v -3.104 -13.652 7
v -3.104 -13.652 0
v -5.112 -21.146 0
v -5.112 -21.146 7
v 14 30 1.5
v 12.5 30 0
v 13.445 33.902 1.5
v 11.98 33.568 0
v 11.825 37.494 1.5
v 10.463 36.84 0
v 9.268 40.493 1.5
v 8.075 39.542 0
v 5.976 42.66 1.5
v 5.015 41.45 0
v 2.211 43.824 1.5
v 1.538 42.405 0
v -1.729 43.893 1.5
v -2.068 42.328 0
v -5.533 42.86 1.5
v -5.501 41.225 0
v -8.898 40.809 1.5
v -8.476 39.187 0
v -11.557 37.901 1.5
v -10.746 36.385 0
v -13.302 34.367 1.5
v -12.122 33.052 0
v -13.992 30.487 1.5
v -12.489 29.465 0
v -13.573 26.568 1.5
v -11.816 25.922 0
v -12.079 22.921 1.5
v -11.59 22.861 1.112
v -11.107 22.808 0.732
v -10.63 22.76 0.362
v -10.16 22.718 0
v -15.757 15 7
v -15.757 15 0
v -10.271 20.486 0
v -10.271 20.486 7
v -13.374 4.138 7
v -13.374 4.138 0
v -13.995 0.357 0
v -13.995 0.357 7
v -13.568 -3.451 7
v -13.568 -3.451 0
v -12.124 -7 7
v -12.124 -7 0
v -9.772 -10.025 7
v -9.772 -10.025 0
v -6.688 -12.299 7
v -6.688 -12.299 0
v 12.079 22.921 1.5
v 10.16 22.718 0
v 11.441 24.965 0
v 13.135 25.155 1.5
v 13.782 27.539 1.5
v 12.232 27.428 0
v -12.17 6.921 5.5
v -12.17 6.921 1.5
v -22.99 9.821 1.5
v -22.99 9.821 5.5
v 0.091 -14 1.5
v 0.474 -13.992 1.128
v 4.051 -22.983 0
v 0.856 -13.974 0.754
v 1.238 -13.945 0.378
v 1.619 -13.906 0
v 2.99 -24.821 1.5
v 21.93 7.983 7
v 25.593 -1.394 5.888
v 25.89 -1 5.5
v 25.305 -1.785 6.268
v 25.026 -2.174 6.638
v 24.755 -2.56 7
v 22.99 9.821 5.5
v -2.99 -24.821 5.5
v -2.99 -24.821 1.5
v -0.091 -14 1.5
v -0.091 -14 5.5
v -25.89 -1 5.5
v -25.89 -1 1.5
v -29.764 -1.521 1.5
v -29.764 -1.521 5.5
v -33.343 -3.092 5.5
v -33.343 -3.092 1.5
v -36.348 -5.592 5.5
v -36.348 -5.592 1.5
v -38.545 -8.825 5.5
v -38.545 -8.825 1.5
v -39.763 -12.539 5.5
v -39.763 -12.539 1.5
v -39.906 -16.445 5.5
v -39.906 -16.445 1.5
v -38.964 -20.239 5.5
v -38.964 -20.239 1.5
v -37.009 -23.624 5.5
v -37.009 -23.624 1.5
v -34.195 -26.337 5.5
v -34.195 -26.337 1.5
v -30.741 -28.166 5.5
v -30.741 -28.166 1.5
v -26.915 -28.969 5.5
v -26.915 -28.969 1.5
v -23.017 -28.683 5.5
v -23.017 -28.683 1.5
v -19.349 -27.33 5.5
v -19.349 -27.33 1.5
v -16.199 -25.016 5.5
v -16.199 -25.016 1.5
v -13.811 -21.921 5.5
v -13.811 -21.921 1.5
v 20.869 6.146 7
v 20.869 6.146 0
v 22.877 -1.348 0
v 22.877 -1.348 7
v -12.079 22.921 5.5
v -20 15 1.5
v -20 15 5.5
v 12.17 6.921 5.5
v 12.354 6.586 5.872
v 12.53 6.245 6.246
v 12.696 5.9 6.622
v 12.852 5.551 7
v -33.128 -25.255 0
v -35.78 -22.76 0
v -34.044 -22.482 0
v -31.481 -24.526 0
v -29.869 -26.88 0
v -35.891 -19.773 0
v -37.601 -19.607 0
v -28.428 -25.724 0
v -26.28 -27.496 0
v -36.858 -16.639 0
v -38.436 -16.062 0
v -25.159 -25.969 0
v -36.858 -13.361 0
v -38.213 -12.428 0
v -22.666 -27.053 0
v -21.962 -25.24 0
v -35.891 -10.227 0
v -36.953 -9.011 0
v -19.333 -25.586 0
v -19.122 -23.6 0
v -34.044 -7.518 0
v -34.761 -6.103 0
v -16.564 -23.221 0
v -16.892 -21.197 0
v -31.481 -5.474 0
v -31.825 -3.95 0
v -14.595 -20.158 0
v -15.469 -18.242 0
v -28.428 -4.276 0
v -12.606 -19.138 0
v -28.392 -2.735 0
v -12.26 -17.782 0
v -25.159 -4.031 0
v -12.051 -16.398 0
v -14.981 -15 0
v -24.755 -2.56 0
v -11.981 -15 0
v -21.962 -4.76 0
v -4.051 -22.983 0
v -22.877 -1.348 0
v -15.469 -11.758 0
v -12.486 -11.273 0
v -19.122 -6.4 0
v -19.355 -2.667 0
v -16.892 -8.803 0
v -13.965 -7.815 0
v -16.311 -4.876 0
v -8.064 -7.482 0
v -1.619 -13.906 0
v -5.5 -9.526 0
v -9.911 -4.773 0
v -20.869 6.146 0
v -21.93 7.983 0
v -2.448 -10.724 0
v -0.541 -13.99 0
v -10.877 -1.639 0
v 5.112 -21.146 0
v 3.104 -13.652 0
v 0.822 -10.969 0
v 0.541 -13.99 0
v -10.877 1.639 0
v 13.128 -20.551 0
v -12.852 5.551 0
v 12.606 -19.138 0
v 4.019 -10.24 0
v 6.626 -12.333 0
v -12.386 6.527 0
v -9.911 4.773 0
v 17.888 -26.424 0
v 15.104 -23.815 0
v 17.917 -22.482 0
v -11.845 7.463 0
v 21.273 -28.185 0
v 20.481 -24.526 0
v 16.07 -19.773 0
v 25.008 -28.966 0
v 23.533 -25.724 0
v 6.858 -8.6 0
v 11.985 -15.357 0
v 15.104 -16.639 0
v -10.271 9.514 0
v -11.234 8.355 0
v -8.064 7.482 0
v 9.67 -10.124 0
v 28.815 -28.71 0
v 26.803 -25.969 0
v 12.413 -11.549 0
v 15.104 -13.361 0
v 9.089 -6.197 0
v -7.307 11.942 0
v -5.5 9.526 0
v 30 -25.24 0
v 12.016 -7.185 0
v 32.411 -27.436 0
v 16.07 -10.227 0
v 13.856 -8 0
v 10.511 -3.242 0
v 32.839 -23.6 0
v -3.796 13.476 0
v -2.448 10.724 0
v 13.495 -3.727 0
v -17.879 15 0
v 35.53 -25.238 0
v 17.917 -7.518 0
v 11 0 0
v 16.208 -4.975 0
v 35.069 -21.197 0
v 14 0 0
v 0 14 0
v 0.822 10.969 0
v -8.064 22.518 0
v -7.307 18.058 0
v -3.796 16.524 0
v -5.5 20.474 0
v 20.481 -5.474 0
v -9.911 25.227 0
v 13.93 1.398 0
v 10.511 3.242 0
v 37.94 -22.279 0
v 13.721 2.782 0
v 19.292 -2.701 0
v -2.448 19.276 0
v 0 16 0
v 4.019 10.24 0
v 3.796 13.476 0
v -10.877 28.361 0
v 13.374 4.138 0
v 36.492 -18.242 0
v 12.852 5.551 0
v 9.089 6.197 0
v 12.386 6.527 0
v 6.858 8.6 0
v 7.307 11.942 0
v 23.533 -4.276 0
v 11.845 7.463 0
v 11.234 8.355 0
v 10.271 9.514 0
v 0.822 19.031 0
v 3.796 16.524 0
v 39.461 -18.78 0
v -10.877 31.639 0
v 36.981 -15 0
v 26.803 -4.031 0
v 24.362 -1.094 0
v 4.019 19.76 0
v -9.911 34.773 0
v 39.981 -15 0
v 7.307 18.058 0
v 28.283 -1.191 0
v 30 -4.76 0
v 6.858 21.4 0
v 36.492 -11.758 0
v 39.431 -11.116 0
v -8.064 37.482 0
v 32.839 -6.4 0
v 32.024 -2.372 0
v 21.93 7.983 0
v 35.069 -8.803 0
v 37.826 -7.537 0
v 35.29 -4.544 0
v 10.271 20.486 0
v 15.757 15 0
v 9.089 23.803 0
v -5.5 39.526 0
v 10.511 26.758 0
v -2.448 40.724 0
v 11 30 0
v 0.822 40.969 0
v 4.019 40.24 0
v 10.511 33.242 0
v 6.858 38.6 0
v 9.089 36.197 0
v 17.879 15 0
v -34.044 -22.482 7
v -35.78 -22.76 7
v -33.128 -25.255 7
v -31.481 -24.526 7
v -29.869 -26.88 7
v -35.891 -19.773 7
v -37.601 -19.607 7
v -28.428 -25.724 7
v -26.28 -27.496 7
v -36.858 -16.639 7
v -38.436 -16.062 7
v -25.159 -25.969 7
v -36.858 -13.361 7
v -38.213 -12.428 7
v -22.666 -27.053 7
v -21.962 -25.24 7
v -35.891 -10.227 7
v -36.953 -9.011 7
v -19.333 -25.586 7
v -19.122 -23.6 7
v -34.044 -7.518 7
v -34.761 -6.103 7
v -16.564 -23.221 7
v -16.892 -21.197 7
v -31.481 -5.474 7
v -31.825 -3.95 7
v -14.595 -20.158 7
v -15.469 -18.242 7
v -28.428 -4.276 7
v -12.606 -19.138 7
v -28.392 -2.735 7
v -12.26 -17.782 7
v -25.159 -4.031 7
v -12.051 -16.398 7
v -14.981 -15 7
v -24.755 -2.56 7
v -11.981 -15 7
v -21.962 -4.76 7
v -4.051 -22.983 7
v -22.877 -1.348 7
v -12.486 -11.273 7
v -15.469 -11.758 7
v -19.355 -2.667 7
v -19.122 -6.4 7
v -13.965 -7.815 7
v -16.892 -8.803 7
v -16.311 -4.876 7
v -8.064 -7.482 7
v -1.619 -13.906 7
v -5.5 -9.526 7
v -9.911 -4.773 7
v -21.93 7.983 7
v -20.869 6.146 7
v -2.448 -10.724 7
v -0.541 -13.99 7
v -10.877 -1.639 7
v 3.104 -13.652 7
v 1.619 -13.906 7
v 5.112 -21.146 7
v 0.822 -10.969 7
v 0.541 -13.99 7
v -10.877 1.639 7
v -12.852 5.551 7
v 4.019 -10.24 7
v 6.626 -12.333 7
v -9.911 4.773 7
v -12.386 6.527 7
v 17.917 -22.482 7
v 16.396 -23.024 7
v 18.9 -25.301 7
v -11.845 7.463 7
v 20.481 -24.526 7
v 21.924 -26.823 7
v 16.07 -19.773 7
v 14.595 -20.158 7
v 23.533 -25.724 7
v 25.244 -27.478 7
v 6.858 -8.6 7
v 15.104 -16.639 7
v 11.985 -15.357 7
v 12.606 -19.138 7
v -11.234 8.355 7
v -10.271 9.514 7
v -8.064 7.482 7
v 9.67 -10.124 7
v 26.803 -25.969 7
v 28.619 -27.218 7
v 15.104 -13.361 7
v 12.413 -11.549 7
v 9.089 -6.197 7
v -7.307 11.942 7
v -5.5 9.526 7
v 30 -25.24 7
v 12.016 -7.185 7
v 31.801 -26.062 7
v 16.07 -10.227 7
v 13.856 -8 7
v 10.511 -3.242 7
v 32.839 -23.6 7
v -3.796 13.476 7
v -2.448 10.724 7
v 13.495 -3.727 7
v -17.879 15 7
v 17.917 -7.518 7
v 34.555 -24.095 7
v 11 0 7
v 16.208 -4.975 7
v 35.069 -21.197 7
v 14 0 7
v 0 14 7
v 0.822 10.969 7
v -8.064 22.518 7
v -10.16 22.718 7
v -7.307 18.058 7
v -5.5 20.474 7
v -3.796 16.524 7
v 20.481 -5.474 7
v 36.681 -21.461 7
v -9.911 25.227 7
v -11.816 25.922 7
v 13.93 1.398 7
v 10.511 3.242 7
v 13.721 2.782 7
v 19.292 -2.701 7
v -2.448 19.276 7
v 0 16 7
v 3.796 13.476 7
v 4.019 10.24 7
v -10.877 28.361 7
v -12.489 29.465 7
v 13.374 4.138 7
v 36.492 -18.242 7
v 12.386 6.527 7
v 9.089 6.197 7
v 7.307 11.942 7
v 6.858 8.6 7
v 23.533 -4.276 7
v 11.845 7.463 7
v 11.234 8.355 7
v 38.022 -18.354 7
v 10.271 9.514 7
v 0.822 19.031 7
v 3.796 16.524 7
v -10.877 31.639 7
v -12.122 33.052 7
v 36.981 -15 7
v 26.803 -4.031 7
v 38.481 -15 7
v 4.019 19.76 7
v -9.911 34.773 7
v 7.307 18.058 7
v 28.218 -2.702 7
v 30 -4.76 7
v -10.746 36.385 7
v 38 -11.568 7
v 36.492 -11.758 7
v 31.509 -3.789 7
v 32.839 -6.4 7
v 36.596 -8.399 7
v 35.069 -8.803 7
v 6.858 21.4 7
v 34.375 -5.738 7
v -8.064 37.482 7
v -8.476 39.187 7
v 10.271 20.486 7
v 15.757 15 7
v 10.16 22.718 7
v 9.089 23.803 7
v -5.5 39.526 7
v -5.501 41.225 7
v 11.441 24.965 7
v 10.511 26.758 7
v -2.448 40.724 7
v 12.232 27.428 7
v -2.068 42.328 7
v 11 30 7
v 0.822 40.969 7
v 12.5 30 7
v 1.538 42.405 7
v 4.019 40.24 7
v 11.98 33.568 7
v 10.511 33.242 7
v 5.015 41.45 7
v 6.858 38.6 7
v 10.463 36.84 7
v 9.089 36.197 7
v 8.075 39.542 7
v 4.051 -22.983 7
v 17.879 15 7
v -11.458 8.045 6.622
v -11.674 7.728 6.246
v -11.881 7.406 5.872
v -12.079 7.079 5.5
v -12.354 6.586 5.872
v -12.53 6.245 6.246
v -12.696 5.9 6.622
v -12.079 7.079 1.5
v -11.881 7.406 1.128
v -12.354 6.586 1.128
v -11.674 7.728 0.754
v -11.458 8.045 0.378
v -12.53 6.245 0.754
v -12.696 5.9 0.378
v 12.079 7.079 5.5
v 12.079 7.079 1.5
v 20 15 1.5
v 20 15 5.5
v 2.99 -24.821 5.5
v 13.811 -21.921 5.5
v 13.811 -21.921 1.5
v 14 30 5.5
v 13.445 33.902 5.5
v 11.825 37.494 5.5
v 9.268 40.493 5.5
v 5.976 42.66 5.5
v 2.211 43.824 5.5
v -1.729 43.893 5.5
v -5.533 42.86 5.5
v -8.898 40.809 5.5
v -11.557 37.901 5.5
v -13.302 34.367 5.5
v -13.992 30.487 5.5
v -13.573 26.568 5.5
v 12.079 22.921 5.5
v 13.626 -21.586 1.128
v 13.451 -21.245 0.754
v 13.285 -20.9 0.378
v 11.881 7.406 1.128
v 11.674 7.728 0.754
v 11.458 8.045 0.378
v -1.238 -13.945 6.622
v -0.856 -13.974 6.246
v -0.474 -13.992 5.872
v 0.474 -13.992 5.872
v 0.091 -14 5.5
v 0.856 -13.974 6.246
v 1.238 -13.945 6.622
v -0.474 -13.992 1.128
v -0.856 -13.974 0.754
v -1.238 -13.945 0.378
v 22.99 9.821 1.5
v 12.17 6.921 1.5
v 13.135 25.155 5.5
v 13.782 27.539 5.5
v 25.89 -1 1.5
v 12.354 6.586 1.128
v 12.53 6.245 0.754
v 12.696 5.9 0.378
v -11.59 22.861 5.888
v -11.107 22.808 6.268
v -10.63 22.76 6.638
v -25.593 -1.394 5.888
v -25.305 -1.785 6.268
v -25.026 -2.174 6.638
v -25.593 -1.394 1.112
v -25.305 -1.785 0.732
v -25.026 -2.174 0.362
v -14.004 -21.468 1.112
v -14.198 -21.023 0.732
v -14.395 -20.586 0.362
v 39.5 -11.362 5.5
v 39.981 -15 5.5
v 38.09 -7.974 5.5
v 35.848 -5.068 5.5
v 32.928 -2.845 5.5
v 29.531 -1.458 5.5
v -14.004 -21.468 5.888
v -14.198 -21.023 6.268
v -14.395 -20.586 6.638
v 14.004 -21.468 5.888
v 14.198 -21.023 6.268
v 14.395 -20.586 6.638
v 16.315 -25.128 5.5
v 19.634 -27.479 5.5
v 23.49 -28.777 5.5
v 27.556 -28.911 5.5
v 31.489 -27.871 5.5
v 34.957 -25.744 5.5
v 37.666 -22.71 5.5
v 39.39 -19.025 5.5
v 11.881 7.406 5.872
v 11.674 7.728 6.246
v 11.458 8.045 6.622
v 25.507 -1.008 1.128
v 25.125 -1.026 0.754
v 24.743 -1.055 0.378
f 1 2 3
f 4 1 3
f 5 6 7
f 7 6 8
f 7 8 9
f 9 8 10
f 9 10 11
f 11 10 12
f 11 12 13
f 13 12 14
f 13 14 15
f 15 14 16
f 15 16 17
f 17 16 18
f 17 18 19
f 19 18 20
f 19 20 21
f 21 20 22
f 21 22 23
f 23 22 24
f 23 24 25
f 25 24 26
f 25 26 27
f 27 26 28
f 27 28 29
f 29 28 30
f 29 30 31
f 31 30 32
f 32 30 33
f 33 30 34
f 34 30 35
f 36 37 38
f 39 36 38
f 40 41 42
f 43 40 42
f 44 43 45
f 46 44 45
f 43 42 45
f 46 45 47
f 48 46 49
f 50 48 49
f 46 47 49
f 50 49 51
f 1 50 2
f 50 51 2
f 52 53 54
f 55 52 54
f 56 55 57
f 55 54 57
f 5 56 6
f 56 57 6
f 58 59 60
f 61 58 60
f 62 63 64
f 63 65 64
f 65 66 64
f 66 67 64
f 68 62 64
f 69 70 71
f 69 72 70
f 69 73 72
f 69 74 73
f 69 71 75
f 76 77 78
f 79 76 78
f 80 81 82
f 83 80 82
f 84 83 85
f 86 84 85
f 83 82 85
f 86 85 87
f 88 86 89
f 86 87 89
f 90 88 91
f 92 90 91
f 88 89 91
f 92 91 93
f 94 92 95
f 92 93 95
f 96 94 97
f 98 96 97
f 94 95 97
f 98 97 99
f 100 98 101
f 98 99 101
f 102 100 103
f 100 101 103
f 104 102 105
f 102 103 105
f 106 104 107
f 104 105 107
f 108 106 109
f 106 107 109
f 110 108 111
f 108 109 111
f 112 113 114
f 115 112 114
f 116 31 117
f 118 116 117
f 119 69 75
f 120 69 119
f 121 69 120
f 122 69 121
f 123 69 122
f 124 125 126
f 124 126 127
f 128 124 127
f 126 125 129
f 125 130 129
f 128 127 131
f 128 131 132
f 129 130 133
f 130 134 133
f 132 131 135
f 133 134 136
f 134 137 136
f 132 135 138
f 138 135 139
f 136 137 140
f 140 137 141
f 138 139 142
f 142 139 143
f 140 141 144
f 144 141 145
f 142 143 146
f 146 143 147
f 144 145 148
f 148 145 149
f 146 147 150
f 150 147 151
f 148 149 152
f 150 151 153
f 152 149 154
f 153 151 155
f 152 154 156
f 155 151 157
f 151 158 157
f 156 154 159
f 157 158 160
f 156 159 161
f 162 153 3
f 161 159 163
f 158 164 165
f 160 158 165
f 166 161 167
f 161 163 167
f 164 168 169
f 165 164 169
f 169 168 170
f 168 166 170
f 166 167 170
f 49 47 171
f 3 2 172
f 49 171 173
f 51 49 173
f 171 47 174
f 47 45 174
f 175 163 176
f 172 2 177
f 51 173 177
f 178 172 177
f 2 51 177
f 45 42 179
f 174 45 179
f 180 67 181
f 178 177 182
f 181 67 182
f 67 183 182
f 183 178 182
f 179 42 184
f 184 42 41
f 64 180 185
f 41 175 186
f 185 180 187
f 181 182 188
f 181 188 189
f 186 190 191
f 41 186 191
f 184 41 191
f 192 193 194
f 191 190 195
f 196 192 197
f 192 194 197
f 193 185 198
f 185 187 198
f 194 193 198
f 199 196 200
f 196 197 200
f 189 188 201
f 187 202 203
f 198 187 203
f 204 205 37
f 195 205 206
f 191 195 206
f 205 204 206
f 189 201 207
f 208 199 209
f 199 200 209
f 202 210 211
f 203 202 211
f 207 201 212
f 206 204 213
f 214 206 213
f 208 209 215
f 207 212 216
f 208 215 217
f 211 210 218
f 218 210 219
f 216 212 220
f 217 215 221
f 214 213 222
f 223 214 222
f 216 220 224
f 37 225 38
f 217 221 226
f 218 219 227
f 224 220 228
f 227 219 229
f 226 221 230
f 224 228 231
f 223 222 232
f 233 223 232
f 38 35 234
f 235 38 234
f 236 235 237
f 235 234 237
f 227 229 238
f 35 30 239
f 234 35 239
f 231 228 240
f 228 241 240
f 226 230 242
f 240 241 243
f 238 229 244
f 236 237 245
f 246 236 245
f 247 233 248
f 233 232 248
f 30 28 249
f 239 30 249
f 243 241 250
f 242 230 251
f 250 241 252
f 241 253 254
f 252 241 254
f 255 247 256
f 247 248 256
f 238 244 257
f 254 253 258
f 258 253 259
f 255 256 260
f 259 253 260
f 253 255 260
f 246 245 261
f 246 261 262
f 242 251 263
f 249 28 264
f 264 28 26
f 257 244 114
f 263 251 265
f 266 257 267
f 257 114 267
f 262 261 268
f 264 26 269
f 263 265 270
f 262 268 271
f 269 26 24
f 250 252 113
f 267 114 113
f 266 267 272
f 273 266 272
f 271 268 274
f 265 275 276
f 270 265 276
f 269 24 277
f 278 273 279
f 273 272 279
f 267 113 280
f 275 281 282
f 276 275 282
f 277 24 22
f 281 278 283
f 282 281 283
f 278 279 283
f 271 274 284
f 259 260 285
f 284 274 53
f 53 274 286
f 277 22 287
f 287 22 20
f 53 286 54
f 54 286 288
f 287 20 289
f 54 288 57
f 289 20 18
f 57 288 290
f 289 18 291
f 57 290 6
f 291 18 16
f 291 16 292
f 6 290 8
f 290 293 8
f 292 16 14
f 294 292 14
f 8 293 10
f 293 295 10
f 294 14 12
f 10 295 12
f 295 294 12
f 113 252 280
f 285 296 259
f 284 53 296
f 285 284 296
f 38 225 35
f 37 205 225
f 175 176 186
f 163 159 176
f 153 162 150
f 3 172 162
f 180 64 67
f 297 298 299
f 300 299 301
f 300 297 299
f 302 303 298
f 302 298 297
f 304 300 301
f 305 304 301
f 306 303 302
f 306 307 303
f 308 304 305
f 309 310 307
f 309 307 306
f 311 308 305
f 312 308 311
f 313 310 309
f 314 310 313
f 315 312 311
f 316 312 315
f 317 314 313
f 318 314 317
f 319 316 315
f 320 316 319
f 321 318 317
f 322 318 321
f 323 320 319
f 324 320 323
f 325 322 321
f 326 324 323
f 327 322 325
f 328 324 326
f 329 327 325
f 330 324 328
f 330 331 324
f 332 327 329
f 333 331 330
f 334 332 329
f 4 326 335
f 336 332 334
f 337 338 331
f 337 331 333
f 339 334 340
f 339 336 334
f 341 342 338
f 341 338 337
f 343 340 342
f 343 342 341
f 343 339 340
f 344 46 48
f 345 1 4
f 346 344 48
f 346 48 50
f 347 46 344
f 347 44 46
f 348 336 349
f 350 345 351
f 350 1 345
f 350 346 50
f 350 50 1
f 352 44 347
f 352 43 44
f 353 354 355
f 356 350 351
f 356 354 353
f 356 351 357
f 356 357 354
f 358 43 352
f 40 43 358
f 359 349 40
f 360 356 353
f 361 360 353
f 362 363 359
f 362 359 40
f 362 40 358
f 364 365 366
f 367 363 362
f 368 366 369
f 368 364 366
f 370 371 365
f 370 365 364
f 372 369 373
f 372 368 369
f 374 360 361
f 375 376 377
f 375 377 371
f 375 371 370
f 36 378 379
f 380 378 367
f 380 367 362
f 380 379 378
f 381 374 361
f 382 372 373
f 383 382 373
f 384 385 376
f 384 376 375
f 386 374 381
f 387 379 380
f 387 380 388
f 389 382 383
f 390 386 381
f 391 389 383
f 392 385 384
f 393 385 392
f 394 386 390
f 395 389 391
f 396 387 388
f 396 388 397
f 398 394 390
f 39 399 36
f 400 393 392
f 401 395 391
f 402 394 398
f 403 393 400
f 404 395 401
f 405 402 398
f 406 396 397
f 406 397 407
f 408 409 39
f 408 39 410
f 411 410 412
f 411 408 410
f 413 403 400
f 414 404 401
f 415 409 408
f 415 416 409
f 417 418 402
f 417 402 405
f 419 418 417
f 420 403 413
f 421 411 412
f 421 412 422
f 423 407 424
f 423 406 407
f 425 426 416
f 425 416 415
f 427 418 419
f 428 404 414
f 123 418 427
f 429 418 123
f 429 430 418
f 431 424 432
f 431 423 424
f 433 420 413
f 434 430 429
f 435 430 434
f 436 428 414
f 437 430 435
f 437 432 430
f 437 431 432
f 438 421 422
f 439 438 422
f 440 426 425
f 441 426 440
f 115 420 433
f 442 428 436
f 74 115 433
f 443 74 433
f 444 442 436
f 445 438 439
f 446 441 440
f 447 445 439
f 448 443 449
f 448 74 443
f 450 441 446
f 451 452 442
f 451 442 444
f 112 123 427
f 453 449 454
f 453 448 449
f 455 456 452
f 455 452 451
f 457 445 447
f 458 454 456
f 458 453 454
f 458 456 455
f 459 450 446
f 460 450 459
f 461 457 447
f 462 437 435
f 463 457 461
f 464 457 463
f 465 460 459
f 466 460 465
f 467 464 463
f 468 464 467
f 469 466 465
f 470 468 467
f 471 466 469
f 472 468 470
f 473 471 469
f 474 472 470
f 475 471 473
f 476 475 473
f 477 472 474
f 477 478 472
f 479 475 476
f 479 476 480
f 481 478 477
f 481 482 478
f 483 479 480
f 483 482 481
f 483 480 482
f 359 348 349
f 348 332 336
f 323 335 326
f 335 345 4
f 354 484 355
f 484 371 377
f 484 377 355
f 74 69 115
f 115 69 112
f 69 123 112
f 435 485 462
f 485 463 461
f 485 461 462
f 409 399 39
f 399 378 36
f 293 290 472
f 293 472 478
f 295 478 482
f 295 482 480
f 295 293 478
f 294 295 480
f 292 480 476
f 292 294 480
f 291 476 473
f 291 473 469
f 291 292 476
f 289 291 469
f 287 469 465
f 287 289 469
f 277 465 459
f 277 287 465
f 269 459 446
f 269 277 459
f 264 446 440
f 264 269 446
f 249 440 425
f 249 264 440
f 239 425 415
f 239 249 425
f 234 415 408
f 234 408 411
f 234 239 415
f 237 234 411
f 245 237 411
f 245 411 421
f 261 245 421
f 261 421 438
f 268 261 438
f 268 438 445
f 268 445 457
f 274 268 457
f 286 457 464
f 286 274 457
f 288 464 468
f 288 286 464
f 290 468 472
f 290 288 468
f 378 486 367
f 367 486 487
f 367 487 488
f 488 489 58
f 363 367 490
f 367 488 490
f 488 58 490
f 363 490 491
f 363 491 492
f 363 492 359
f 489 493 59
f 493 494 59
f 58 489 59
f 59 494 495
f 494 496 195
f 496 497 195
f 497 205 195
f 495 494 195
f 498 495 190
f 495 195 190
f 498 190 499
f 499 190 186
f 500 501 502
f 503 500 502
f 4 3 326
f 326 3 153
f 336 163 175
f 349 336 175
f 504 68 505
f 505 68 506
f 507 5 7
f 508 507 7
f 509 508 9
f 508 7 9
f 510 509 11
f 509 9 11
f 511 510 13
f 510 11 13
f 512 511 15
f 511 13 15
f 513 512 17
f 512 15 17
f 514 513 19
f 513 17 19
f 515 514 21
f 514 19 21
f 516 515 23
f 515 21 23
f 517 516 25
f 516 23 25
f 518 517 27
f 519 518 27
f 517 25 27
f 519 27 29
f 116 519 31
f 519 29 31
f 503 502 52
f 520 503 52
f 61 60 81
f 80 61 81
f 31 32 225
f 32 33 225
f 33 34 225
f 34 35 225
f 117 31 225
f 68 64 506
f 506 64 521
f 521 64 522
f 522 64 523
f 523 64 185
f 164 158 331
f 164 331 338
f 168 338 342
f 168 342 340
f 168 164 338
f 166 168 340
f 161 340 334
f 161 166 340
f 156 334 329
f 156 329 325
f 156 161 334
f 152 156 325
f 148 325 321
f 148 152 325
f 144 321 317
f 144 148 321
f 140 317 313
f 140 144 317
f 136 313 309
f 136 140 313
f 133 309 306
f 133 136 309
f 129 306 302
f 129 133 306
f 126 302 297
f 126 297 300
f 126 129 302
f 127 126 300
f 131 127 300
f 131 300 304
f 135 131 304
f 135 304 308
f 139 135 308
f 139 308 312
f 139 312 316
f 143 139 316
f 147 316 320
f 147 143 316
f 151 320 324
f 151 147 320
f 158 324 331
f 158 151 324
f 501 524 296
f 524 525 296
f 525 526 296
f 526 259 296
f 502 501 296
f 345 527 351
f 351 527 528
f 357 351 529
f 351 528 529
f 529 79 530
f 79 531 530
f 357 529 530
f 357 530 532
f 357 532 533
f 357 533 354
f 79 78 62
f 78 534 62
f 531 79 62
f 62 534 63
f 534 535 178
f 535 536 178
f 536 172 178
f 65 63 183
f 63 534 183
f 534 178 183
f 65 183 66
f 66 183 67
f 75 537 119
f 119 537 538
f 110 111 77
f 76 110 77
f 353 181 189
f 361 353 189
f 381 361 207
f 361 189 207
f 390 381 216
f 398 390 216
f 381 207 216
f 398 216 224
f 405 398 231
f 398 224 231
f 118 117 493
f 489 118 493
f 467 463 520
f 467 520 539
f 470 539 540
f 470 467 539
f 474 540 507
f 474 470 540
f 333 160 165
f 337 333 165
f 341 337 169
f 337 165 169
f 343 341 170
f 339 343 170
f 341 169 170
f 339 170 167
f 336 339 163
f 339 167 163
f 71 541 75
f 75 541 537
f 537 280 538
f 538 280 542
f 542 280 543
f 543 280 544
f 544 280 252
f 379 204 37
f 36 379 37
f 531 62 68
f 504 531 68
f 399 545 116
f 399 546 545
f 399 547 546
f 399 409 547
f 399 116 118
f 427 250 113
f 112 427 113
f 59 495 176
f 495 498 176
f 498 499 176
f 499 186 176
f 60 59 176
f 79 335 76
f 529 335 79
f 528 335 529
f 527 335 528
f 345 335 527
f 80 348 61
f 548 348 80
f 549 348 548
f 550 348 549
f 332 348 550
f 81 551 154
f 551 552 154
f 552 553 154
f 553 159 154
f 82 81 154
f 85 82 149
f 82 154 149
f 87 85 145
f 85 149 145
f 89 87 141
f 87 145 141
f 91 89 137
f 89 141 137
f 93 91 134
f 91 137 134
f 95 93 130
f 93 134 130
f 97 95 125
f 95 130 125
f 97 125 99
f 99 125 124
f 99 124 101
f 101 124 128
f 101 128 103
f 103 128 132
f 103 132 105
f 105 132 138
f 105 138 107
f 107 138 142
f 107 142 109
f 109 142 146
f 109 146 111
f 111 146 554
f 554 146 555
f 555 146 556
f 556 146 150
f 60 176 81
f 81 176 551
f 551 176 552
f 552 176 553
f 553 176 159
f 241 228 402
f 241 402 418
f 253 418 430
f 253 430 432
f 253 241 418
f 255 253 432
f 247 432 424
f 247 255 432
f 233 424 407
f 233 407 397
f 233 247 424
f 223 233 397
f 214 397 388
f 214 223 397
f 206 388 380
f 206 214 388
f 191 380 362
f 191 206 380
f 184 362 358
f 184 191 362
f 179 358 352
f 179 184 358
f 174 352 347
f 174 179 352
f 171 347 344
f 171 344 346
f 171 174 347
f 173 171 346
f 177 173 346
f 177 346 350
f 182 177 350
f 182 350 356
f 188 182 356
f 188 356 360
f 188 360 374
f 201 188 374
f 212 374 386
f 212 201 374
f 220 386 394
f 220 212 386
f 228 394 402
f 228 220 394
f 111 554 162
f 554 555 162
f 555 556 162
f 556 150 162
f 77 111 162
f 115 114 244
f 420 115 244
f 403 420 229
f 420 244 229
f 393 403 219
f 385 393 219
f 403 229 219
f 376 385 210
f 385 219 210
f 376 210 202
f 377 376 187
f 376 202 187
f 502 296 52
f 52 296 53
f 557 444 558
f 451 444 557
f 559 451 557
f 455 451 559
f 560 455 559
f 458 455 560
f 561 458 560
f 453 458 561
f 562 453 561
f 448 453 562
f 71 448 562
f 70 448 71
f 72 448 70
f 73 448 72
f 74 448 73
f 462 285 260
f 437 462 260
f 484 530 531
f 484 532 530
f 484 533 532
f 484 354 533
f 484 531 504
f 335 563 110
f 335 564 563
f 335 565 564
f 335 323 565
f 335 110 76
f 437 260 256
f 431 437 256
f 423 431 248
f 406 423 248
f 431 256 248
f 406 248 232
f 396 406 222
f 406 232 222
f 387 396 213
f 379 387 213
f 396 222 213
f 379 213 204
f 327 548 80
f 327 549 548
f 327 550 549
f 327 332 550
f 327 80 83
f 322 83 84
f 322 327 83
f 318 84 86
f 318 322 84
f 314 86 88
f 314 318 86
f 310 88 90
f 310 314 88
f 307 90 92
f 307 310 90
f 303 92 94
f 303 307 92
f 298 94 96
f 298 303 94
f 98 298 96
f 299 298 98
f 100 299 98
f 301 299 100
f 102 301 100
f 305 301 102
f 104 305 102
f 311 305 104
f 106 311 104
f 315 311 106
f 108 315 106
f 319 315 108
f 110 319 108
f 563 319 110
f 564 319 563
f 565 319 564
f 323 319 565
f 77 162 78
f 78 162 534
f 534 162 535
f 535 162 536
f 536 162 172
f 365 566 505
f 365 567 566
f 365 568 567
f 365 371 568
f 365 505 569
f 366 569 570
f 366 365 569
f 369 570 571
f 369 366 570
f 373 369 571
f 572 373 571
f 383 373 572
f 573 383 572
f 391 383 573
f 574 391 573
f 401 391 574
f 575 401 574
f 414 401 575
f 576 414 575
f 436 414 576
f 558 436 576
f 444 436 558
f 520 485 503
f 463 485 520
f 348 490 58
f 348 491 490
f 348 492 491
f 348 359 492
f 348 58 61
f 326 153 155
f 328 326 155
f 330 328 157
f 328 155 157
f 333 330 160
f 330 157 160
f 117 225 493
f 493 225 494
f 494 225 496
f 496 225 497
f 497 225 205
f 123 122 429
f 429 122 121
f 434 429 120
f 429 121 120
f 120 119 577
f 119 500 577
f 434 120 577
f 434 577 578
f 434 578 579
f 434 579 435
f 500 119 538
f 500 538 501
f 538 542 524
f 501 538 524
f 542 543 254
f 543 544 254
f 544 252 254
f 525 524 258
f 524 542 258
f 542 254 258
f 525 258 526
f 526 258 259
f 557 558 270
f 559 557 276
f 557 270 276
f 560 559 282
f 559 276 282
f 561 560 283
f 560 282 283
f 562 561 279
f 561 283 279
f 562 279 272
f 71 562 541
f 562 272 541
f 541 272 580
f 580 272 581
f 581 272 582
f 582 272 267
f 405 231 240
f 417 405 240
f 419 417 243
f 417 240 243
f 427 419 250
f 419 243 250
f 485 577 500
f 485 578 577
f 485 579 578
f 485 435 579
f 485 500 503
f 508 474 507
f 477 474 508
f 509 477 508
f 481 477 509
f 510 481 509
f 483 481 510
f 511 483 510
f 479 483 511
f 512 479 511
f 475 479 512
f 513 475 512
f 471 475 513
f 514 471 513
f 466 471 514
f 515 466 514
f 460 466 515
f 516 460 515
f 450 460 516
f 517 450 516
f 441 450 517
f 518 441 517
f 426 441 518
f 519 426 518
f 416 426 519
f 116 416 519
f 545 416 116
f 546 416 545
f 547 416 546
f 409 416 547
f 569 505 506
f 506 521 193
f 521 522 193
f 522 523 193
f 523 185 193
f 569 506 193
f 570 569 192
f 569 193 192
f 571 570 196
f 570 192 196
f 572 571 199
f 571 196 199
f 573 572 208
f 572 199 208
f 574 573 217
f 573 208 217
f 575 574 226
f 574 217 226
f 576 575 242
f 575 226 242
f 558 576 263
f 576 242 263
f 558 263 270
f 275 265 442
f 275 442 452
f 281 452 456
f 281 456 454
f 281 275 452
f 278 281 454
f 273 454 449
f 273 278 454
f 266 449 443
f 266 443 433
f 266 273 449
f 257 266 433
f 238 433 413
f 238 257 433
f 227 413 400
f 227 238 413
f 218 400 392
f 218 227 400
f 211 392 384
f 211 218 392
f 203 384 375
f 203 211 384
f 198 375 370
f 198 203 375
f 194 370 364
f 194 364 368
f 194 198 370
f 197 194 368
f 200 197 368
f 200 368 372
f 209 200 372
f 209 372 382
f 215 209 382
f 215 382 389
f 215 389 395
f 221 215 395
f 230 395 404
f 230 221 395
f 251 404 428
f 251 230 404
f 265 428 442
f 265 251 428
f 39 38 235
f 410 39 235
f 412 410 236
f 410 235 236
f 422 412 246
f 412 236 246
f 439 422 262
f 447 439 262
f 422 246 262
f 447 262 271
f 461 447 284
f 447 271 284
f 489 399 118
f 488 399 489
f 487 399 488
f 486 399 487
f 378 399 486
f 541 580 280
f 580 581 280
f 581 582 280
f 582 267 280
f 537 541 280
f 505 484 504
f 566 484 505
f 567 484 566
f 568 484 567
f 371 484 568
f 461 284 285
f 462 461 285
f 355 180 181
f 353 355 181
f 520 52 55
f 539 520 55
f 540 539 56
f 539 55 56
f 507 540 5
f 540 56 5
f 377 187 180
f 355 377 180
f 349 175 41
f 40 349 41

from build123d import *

# Parameters (mm, degrees)
F0_R     = 11
F1_DEPTH = 7
F2_SIZE  = 1.5


with BuildPart() as f1:
    # F0 (on Top) → F1 (new body)
    with BuildSketch(Plane.XY):
        with BuildLine():
            ThreePointArc((10.2709292347, 9.5135699218), (11.240900909, 8.3451870413), (12.0786220303, 7.0786220303))
            Line((12.0786220303, 7.0786220303), (20, 15))
            Line((20, 15), (12.0786220303, 22.9213779697))
            ThreePointArc((12.0786220303, 22.9213779697), (11.240900909, 21.6548129587), (10.2709292347, 20.4864300782))
            Line((10.2709292347, 20.4864300782), (15.7573593129, 15))
            Line((15.7573593129, 15), (10.2709292347, 9.5135699218))
        make_face()
        with BuildLine():
            ThreePointArc((10.2709292347, 20.4864300782), (11.240900909, 21.6548129587), (12.0786220303, 22.9213779697))
            ThreePointArc((12.0786220303, 22.9213779697), (13.5111196506, 26.3326241278), (14, 30))
            ThreePointArc((14, 30), (-3.6673758722, 43.5111196506), (-12.0786220303, 22.9213779697))
            ThreePointArc((-12.0786220303, 22.9213779697), (-11.240900909, 21.6548129587), (-10.2709292347, 20.4864300782))
            ThreePointArc((-10.2709292347, 20.4864300782), (0, 16), (10.2709292347, 20.4864300782))
        make_face()
        with Locations((0, 30)):
            Circle(F0_R, mode=Mode.SUBTRACT)
        with BuildLine():
            ThreePointArc((-12.0786220303, 7.0786220303), (-11.240900909, 8.3451870413), (-10.2709292347, 9.5135699218))
            Line((-10.2709292347, 9.5135699218), (-15.7573593129, 15))
            Line((-15.7573593129, 15), (-10.2709292347, 20.4864300782))
            ThreePointArc((-10.2709292347, 20.4864300782), (-11.240900909, 21.6548129587), (-12.0786220303, 22.9213779697))
            Line((-12.0786220303, 22.9213779697), (-20, 15))
            Line((-20, 15), (-12.0786220303, 7.0786220303))
        make_face()
        with BuildLine():
            Line((-20.8690607132, 6.1462734615), (-13.3744578503, 4.1381006768))
            ThreePointArc((-13.3744578503, 4.1381006768), (-12.8475944316, 5.5623122279), (-12.1695775172, 6.9210825058))
            Line((-12.1695775172, 6.9210825058), (-22.9903810568, 9.8205080757))
            Line((-22.9903810568, 9.8205080757), (-25.8898066266, -1.0002954639))
            ThreePointArc((-25.8898066266, -1.0002954639), (-24.3740685909, -1.0925007307), (-22.8772334979, -1.3483294014))
            Line((-22.8772334979, -1.3483294014), (-20.8690607132, 6.1462734615))
        make_face()
        with BuildLine():
            ThreePointArc((3.1035286156, -13.6516705986), (10.9418782807, -8.7335731342), (14, 0))
            ThreePointArc((14, 0), (13.8427311233, 2.0925570597), (13.3744578503, 4.1381006768))
            ThreePointArc((13.3744578503, 4.1381006768), (12.8475944316, 5.5623122279), (12.1695775172, 6.9210825058))
            ThreePointArc((12.1695775172, 6.9210825058), (12.124355653, 7), (12.0786220303, 7.0786220303))
            ThreePointArc((12.0786220303, 7.0786220303), (11.240900909, 8.3451870413), (10.2709292347, 9.5135699218))
            ThreePointArc((10.2709292347, 9.5135699218), (0, 14), (-10.2709292347, 9.5135699218))
            ThreePointArc((-10.2709292347, 9.5135699218), (-11.240900909, 8.3451870413), (-12.0786220303, 7.0786220303))
            ThreePointArc((-12.0786220303, 7.0786220303), (-12.124355653, 7), (-12.1695775172, 6.9210825058))
            ThreePointArc((-12.1695775172, 6.9210825058), (-12.8475944316, 5.5623122279), (-13.3744578503, 4.1381006768))
            ThreePointArc((-13.3744578503, 4.1381006768), (-12.124355653, -7), (-3.1035286156, -13.6516705986))
            ThreePointArc((-3.1035286156, -13.6516705986), (-1.6066935226, -13.9074992693), (-0.0909554869, -13.9997045361))
            ThreePointArc((-0.0909554869, -13.9997045361), (0, -14), (0.0909554869, -13.9997045361))
            ThreePointArc((0.0909554869, -13.9997045361), (1.6066935226, -13.9074992693), (3.1035286156, -13.6516705986))
        make_face()
        Circle(F0_R, mode=Mode.SUBTRACT)
        with BuildLine():
            ThreePointArc((-25.8898066266, -1.0002954639), (-38.1051177665, -22), (-13.8111845963, -21.9210825058))
            ThreePointArc((-13.8111845963, -21.9210825058), (-13.1331676819, -20.5623122279), (-12.6063042633, -19.1381006768))
            ThreePointArc((-12.6063042633, -19.1381006768), (-12.1380309902, -17.0925570597), (-11.9807621135, -15))
            ThreePointArc((-11.9807621135, -15), (-15.0388838329, -6.2664268658), (-22.8772334979, -1.3483294014))
            ThreePointArc((-22.8772334979, -1.3483294014), (-24.3740685909, -1.0925007307), (-25.8898066266, -1.0002954639))
        make_face()
        with Locations((-25.9807621135, -15)):
            Circle(F0_R, mode=Mode.SUBTRACT)
        with BuildLine():
            Line((-2.9903810568, -24.8205080757), (-0.0909554869, -13.9997045361))
            ThreePointArc((-0.0909554869, -13.9997045361), (-1.6066935226, -13.9074992693), (-3.1035286156, -13.6516705986))
            Line((-3.1035286156, -13.6516705986), (-5.1117014003, -21.1462734615))
            Line((-5.1117014003, -21.1462734615), (-12.6063042633, -19.1381006768))
            ThreePointArc((-12.6063042633, -19.1381006768), (-13.1331676819, -20.5623122279), (-13.8111845963, -21.9210825058))
            Line((-13.8111845963, -21.9210825058), (-2.9903810568, -24.8205080757))
        make_face()
        with BuildLine():
            Line((5.1117014003, -21.1462734615), (3.1035286156, -13.6516705986))
            ThreePointArc((3.1035286156, -13.6516705986), (1.6066935226, -13.9074992693), (0.0909554869, -13.9997045361))
            Line((0.0909554869, -13.9997045361), (2.9903810568, -24.8205080757))
            Line((2.9903810568, -24.8205080757), (13.8111845963, -21.9210825058))
            ThreePointArc((13.8111845963, -21.9210825058), (13.1331676819, -20.5623122279), (12.6063042633, -19.1381006768))
            Line((12.6063042633, -19.1381006768), (5.1117014003, -21.1462734615))
        make_face()
        with BuildLine():
            ThreePointArc((12.1695775172, 6.9210825058), (12.8475944316, 5.5623122279), (13.3744578503, 4.1381006768))
            Line((13.3744578503, 4.1381006768), (20.8690607132, 6.1462734615))
            Line((20.8690607132, 6.1462734615), (22.8772334979, -1.3483294014))
            ThreePointArc((22.8772334979, -1.3483294014), (24.3740685909, -1.0925007307), (25.8898066266, -1.0002954639))
            Line((25.8898066266, -1.0002954639), (22.9903810568, 9.8205080757))
            Line((22.9903810568, 9.8205080757), (12.1695775172, 6.9210825058))
        make_face()
        with BuildLine():
            ThreePointArc((25.8898066266, -1.0002954639), (24.3740685909, -1.0925007307), (22.8772334979, -1.3483294014))
            ThreePointArc((22.8772334979, -1.3483294014), (13.8564064606, -8), (12.6063042633, -19.1381006768))
            ThreePointArc((12.6063042633, -19.1381006768), (13.1331676819, -20.5623122279), (13.8111845963, -21.9210825058))
            ThreePointArc((13.8111845963, -21.9210825058), (29.5602812683, -28.5346607871), (39.9807621135, -15))
            ThreePointArc((39.9807621135, -15), (35.8480470284, -5.0683995042), (25.8898066266, -1.0002954639))
        make_face()
        with Locations((25.9807621135, -15)):
            Circle(F0_R, mode=Mode.SUBTRACT)
    extrude(amount=F1_DEPTH)

    # F2
    f2_edges = [f1.edges().sort_by_distance(p)[0] for p in [
        (0, 44, 7),
        (-16.039311, 18.960689, 7),
        (-16.039311, 11.039311, 7),
        (-17.579979, 8.370795, 7),
        (-24.440094, 4.410106, 7),
        (-38.105118, -22, 7),
        (-8.400783, -23.370795, 7),
        (-1.540668, -19.410106, 7),
        (1.540668, -19.410106, 7),
        (8.400783, -23.370795, 7),
        (38.105118, -22, 7),
        (24.440094, 4.410106, 7),
        (17.579979, 8.370795, 7),
        (16.039311, 11.039311, 7),
        (16.039311, 18.960689, 7),
        (8.400783, -23.370795, 0),
        (24.440094, 4.410106, 0),
        (17.579979, 8.370795, 0),
        (16.039311, 11.039311, 0),
        (16.039311, 18.960689, 0),
        (0, 44, 0),
        (-16.039311, 18.960689, 0),
        (-16.039311, 11.039311, 0),
        (-17.579979, 8.370795, 0),
        (-24.440094, 4.410106, 0),
        (-38.105118, -22, 0),
        (-8.400783, -23.370795, 0),
        (-1.540668, -19.410106, 0),
        (1.540668, -19.410106, 0),
    ]]
    chamfer(f2_edges, length=F2_SIZE)


solid = f1.part
